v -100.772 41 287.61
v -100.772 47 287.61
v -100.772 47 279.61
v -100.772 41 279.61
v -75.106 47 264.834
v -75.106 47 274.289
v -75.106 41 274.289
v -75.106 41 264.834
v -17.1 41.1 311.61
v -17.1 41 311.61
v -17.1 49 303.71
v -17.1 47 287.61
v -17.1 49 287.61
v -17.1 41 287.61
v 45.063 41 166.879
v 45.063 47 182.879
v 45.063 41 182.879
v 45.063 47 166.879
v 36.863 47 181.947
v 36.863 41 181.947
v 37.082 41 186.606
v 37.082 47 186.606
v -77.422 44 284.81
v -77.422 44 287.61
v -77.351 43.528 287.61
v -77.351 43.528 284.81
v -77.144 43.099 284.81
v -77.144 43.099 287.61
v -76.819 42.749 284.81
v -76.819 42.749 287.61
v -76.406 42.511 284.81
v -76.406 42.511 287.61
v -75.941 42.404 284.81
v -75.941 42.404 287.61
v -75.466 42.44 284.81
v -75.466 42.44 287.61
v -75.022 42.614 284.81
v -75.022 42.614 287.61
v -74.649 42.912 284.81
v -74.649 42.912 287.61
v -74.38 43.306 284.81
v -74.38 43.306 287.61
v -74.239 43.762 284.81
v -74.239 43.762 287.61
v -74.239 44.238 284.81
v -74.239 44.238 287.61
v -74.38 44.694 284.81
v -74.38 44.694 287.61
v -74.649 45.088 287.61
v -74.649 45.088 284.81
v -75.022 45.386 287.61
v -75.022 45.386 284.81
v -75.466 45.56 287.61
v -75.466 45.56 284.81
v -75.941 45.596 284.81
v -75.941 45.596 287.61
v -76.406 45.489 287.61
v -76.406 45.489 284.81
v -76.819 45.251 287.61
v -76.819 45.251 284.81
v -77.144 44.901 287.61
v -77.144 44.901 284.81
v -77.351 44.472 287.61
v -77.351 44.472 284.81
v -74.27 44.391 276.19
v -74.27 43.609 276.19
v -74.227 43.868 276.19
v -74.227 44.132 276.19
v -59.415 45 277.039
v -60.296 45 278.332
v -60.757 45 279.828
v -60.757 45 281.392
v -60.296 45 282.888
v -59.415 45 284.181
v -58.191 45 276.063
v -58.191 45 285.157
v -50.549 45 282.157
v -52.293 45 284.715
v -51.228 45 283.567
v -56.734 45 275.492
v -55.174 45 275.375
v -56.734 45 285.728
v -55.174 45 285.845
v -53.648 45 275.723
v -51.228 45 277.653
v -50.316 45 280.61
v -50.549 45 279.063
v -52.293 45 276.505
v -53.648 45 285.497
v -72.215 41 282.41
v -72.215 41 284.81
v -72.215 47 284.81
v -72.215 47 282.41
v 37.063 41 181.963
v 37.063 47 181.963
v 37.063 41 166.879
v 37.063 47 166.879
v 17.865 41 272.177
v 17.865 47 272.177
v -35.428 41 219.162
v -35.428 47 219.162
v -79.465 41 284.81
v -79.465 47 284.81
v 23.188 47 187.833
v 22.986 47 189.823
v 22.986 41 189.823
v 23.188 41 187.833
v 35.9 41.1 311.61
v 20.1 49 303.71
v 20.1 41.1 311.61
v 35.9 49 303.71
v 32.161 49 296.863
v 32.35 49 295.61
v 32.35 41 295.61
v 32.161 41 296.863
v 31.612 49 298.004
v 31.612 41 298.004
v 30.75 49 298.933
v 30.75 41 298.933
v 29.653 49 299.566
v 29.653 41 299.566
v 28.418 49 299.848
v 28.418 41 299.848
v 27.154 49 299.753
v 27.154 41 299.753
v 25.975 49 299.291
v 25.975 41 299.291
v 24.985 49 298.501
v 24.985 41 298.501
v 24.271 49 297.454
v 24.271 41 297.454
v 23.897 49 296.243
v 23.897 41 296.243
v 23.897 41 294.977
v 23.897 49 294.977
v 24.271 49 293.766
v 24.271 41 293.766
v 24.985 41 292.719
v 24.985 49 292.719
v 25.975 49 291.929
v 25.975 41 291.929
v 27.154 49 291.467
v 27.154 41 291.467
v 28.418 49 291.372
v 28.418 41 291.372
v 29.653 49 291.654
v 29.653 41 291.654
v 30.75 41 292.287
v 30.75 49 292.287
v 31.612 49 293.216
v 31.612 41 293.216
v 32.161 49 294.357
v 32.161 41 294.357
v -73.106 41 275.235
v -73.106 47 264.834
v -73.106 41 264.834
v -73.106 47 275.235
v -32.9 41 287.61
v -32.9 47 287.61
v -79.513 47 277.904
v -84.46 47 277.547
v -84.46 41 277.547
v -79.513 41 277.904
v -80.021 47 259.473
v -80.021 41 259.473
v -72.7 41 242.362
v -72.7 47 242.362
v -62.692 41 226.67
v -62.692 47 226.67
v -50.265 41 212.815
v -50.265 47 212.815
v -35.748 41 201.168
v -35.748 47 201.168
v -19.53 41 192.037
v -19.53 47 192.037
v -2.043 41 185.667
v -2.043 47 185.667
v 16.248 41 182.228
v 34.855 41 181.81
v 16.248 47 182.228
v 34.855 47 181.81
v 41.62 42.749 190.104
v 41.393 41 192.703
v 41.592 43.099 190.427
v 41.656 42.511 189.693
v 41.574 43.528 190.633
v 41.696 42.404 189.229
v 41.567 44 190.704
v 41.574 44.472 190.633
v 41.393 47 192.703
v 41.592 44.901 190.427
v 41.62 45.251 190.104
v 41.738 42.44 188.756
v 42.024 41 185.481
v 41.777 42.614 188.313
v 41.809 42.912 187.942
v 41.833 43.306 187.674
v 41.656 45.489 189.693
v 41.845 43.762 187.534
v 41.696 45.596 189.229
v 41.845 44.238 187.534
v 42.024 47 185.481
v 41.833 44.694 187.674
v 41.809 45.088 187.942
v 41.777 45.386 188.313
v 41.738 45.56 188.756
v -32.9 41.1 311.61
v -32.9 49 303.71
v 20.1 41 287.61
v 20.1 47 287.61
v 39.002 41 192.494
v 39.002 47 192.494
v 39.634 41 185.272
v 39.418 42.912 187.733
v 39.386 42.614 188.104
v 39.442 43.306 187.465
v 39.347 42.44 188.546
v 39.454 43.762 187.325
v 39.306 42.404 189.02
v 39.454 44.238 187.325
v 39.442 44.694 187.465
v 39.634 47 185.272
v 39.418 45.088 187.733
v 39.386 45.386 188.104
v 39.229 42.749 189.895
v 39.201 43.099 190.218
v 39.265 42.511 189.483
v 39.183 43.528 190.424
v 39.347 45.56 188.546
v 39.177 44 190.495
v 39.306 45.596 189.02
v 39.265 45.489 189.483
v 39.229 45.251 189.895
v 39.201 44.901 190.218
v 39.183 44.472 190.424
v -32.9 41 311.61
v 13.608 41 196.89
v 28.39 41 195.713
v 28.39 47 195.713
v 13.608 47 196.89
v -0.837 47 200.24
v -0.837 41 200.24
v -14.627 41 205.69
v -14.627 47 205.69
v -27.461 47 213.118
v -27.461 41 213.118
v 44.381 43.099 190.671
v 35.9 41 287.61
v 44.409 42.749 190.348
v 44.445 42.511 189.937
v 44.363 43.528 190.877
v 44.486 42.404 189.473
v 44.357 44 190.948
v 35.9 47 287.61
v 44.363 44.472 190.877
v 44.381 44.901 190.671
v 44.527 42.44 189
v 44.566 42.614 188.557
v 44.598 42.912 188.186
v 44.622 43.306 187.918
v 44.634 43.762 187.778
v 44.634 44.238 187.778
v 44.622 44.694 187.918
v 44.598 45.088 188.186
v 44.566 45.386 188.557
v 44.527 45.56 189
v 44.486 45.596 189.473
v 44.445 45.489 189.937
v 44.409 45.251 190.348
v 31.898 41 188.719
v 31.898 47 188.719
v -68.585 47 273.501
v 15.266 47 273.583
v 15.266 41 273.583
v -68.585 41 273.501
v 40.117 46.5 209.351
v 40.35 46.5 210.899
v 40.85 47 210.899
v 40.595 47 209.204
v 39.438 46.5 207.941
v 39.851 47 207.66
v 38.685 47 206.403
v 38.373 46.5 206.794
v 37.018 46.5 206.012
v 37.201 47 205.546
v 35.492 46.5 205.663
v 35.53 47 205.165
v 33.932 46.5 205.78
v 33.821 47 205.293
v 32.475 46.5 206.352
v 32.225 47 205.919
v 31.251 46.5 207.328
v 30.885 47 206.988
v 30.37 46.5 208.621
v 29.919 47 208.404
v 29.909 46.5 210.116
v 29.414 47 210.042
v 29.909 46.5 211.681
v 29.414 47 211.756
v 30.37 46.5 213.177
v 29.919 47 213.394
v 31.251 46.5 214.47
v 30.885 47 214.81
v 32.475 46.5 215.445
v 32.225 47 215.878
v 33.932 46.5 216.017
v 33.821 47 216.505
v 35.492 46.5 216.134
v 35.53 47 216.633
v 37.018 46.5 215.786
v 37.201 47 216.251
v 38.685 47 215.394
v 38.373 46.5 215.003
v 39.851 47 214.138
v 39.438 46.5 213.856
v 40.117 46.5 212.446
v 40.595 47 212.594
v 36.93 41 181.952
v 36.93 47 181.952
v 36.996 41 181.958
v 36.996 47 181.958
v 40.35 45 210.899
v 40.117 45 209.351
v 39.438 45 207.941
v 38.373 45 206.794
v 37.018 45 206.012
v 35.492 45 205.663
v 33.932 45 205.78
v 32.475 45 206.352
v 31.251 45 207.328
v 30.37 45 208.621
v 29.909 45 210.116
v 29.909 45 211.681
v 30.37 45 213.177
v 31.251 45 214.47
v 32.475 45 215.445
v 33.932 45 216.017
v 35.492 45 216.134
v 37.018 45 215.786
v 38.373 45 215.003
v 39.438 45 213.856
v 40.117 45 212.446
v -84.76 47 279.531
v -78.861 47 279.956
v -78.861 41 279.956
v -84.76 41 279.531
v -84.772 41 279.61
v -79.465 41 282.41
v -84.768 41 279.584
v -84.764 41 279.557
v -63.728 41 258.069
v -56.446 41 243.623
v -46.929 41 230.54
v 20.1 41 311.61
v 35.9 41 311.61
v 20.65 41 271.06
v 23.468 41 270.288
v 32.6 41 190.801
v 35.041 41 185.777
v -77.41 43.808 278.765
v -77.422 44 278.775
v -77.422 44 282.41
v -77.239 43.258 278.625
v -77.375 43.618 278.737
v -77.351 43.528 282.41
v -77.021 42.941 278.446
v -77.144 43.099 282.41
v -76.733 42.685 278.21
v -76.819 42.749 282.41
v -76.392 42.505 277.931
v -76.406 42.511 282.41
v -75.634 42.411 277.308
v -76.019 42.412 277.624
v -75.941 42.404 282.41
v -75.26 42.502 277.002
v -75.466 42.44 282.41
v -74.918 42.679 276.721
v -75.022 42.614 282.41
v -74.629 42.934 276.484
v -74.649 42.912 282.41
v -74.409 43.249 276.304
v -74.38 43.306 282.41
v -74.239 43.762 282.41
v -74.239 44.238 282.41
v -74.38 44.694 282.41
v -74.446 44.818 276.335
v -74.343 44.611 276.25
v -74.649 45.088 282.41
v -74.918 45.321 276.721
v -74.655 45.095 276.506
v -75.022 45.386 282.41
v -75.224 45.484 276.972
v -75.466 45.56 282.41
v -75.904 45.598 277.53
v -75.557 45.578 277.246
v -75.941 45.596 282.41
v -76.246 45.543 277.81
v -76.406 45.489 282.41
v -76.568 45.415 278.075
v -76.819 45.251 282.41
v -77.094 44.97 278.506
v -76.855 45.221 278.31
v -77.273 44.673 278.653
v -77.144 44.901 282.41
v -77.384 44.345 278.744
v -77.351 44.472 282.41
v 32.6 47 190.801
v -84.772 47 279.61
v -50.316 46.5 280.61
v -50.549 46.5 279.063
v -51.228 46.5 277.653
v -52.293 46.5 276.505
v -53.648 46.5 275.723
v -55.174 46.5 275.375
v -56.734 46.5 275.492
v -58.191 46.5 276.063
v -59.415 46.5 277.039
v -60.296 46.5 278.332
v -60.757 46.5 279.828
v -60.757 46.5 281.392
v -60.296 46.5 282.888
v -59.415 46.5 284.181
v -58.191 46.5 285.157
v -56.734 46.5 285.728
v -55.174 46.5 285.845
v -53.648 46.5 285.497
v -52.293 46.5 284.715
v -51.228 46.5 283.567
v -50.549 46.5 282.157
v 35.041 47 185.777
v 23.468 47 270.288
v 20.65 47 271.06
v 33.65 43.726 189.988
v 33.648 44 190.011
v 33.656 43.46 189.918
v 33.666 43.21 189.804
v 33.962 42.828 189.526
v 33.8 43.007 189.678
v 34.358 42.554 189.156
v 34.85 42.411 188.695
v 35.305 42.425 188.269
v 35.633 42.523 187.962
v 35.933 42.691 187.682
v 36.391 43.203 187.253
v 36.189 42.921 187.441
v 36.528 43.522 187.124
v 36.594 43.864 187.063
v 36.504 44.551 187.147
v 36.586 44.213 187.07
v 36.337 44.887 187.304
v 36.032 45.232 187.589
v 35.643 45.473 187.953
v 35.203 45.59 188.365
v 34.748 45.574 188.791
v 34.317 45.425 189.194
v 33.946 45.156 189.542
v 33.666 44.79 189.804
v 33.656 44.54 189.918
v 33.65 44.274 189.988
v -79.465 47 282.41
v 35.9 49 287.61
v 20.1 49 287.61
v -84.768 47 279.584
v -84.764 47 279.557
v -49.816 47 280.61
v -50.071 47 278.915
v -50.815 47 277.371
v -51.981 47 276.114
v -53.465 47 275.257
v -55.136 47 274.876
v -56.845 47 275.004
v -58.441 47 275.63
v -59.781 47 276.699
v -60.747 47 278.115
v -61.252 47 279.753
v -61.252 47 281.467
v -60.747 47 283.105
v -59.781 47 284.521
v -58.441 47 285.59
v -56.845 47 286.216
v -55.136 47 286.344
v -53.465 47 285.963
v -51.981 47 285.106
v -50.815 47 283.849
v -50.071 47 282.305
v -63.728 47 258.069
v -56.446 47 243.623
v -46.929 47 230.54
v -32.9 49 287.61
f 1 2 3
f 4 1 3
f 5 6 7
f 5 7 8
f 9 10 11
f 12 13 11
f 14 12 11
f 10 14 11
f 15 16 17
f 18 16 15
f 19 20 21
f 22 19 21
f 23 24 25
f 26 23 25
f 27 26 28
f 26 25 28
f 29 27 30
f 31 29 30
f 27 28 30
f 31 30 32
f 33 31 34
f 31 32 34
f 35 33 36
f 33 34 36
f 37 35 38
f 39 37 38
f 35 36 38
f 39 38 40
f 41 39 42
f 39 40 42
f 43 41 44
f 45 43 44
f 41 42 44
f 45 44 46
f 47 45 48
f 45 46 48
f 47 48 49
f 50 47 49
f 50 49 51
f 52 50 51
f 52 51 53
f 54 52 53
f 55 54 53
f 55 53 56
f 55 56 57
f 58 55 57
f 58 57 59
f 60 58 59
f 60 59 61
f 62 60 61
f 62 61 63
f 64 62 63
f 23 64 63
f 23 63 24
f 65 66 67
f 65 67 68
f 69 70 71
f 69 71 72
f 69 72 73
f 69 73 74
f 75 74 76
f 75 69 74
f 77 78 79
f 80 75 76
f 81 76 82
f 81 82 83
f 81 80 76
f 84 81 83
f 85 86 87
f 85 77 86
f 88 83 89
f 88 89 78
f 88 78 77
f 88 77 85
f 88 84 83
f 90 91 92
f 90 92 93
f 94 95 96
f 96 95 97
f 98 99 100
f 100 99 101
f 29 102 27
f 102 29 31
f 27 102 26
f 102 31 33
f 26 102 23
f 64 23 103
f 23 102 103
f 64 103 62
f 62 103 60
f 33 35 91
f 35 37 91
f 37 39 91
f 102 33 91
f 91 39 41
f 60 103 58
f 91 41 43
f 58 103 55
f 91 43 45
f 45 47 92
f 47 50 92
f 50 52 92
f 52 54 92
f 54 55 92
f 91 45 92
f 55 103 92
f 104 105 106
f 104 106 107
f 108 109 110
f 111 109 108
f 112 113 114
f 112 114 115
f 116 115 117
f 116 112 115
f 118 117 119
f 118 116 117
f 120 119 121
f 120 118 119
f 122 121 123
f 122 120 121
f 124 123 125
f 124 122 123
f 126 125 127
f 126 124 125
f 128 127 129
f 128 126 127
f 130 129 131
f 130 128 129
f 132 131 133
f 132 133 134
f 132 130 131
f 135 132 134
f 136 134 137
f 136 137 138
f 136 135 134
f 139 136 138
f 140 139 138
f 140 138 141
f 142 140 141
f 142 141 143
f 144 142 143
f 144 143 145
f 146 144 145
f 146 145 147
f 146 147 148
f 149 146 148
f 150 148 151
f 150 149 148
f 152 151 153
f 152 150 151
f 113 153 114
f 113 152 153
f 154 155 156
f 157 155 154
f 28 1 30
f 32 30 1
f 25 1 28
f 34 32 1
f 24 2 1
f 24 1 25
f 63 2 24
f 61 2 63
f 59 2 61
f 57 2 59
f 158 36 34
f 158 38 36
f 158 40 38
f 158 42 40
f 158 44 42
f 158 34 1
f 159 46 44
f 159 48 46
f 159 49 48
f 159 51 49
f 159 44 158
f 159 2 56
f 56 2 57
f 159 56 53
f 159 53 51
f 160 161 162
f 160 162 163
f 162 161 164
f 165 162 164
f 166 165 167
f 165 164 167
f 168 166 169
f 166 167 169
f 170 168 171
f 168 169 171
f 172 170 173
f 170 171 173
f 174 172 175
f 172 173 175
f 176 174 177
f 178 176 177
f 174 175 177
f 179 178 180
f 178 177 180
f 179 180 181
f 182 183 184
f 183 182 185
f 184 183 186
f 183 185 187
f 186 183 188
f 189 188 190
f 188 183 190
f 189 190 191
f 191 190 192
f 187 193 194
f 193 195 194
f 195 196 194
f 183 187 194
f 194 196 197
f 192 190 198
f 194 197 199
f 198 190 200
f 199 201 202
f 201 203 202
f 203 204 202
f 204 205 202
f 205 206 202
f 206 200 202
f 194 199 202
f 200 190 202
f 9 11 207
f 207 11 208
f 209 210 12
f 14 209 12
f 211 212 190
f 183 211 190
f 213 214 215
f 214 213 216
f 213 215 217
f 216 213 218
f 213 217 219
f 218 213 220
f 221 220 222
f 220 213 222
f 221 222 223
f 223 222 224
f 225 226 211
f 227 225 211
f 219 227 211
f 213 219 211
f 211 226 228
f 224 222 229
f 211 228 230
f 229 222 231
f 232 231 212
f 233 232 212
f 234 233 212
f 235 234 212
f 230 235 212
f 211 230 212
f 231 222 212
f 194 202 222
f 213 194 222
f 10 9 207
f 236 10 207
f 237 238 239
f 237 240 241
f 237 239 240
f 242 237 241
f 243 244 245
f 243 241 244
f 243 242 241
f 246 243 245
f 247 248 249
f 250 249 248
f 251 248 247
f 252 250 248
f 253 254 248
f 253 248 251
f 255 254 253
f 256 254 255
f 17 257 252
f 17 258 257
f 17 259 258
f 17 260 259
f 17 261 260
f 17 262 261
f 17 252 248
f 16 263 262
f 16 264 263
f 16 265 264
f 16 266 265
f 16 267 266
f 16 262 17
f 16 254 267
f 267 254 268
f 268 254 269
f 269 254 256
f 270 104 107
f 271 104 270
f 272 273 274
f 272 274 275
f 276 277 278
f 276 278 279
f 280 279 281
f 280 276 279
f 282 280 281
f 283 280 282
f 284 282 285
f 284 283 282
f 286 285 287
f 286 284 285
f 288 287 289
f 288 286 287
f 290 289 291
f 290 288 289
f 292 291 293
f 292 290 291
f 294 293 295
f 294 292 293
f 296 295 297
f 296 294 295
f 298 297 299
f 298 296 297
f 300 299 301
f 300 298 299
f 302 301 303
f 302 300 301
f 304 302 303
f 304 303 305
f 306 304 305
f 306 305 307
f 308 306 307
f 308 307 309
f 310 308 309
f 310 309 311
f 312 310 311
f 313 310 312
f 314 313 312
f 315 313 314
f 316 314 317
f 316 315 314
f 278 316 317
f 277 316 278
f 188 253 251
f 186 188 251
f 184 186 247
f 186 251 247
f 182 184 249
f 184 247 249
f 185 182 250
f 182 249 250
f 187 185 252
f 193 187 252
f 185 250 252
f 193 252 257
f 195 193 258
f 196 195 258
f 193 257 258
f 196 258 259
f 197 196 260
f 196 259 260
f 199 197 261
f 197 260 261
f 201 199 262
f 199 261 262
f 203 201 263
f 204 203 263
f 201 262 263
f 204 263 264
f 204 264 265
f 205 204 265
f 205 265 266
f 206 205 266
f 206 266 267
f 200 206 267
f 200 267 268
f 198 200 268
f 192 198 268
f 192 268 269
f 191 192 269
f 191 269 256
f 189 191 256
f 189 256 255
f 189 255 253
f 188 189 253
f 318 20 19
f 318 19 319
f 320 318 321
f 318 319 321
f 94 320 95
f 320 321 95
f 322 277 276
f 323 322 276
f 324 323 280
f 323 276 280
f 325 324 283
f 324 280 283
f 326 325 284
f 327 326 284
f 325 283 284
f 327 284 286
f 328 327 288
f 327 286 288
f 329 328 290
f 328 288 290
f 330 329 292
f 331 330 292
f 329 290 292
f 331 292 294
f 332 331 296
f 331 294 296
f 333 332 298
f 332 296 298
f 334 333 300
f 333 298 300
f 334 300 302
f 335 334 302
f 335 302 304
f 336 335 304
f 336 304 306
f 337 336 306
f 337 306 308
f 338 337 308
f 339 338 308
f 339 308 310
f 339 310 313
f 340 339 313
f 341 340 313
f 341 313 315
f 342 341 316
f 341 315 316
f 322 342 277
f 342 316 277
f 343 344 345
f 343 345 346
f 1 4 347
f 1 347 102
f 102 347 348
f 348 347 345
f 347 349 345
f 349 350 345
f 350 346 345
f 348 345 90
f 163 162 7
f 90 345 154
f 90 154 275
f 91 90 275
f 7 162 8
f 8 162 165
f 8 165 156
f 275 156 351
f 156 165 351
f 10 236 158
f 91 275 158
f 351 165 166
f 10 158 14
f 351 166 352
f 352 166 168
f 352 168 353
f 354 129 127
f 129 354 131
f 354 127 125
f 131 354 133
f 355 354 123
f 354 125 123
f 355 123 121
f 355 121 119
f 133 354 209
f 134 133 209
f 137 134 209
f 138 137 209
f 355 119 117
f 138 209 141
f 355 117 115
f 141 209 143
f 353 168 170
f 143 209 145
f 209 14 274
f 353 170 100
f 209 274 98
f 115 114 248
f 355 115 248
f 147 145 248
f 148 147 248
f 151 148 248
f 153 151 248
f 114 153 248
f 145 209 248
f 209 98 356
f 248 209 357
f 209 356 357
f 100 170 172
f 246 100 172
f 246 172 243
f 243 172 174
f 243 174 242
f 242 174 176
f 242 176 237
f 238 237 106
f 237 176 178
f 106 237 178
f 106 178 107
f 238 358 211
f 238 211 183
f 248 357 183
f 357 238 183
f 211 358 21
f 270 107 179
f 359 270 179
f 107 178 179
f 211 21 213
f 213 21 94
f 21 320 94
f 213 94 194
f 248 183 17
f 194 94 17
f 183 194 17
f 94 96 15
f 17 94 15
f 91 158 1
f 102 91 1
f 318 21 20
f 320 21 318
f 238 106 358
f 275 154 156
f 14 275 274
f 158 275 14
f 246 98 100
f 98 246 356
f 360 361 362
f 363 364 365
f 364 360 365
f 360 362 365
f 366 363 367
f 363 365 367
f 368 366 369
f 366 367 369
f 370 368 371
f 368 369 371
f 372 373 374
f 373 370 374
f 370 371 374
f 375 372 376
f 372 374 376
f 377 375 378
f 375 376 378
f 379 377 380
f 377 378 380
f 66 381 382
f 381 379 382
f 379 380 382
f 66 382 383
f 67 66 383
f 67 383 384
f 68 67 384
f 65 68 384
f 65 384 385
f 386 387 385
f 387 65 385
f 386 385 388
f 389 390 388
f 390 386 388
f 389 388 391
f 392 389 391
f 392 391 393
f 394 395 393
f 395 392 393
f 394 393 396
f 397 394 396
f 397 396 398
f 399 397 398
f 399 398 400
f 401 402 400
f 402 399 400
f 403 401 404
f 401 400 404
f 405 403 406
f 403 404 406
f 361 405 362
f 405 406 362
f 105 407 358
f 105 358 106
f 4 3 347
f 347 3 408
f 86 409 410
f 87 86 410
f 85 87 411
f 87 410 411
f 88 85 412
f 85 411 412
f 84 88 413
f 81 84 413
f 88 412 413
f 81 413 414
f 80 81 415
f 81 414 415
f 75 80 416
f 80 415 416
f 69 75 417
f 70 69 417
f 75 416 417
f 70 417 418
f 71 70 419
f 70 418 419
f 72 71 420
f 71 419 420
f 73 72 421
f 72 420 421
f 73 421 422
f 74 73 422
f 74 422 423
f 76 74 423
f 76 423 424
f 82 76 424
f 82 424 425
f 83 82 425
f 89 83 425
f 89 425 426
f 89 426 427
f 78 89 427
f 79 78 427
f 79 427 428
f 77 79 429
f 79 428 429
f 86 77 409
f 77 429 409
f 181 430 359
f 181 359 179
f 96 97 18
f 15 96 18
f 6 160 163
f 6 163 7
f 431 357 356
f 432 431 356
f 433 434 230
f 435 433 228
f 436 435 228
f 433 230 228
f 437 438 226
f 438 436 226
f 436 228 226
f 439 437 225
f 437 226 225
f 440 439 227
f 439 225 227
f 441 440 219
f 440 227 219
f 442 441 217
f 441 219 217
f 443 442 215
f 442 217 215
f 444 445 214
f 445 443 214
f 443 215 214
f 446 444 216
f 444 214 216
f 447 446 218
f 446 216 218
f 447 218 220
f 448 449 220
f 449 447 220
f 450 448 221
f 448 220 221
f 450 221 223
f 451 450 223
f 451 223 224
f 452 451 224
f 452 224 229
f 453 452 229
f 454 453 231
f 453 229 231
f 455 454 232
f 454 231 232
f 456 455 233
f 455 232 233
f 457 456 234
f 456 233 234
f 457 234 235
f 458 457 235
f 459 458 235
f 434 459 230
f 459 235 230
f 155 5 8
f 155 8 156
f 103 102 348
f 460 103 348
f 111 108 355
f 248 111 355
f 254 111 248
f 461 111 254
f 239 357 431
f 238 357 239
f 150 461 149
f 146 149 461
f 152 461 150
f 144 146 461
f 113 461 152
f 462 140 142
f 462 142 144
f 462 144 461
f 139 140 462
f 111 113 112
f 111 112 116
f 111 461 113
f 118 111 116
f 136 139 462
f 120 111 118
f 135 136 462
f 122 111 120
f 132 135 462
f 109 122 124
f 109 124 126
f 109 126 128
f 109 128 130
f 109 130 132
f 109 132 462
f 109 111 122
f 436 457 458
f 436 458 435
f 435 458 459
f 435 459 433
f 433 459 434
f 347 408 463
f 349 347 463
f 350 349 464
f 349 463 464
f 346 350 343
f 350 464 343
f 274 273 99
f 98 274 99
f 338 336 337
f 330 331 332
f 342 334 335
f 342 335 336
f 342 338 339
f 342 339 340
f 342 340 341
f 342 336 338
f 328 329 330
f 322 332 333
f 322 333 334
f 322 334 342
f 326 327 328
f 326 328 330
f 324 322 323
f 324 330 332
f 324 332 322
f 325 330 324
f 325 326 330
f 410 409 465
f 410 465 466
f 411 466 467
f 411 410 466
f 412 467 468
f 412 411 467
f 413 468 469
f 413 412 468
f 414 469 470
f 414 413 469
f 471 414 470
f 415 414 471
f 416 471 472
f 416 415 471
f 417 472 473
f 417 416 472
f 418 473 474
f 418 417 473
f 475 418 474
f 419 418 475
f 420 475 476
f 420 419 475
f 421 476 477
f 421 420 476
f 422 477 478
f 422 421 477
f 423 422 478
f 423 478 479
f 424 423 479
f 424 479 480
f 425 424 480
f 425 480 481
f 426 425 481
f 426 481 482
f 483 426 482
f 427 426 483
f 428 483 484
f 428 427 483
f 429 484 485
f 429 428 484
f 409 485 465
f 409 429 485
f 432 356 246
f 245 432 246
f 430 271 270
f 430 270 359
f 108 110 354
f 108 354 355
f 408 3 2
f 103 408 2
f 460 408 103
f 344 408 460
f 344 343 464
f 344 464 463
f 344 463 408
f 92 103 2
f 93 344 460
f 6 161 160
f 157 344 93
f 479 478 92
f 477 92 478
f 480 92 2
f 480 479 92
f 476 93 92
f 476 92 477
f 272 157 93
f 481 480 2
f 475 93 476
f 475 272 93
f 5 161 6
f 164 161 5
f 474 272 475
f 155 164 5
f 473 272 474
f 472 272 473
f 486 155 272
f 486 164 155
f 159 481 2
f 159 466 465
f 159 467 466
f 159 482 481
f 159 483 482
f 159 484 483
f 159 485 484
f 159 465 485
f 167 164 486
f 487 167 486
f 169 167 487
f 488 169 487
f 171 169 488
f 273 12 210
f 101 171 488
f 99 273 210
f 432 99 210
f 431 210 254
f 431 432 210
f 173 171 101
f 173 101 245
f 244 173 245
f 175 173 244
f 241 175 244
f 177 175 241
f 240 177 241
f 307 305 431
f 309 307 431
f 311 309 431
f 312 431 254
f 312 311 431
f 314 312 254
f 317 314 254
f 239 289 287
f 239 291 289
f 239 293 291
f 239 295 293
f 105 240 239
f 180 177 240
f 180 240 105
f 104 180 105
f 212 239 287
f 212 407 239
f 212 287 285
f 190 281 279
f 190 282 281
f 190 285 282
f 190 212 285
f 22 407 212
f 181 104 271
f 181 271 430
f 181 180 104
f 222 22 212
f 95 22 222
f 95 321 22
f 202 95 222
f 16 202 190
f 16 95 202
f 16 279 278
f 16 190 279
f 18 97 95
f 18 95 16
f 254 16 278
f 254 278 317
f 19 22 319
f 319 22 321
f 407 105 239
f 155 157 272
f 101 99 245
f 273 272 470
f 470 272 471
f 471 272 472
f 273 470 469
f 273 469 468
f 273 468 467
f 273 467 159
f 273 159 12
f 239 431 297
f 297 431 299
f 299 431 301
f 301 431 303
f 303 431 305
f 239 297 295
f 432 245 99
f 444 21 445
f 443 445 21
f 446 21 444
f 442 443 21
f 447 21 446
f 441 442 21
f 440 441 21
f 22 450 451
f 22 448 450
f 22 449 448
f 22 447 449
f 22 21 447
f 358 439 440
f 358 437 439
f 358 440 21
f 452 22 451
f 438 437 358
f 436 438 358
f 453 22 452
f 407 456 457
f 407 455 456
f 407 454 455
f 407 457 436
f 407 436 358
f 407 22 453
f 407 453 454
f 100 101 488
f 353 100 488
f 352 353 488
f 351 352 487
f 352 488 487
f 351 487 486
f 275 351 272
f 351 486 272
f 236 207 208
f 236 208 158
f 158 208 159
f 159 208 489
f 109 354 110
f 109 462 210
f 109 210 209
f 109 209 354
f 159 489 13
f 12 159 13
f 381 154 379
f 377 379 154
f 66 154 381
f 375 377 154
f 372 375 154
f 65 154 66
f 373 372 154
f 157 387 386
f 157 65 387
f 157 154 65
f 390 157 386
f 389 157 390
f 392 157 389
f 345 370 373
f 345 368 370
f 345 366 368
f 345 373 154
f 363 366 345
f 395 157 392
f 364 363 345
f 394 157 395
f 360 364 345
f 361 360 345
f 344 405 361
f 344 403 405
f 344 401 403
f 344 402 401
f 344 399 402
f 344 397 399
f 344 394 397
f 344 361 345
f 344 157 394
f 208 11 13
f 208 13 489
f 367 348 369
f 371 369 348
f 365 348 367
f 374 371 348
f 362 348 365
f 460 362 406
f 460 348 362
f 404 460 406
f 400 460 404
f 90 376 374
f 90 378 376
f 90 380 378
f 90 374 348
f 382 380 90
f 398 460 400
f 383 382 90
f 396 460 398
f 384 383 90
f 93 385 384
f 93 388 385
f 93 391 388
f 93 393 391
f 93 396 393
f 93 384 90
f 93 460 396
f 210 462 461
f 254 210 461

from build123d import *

# Parameters (mm, degrees)
SKETCH119_R     = 4.25
PAD037_DEPTH    = 8
POCKET089_DEPTH = 10
SKETCH145_W     = 212.757988
SKETCH145_H     = 111.377136
POCKET090_DEPTH = 2
CHAMFER024_SIZE = 7.9
SKETCH146_W     = 16
SKETCH146_H     = 8
SKETCH146_W_2   = 8
SKETCH146_H_2   = 16
PAD043_DEPTH    = 6
POCKET091_DEPTH = 6
SKETCH148_R     = 5.25
POCKET092_DEPTH = 2
CHAMFER025_SIZE = 0.5
SKETCH149_W     = 7.25
SKETCH149_H     = 2.4
POCKET093_DEPTH = 6
SKETCH150_R     = 1.6
POCKET094_DEPTH = 11.42
SKETCH151_R     = 1.6
POCKET095_DEPTH = 10.75


with BuildPart() as part:
    # Sketch119 → Pad037 (new body)
    with BuildSketch(Plane.XZ):
        with BuildLine():
            Line((43.1, 311.61), (58.9, 311.61))
            Line((58.9, 311.61), (58.9, 287.61))
            Line((58.9, 287.61), (68.0627698178, 182.8790617439))
            ThreePointArc((-62.6189518066, 287.61), (-20.1922299081, 206.652605958), (68.0627698178, 182.8790617439))
            Line((-9.9, 287.61), (-62.6189518066, 287.61))
            Line((-9.9, 311.61), (-9.9, 287.61))
            Line((5.9, 311.61), (-9.9, 311.61))
            Line((5.9, 287.61), (5.9, 311.61))
            Line((43.1, 287.61), (5.9, 287.61))
            Line((43.1, 287.61), (43.1, 311.61))
        make_face()
        with Locations((51.1, 295.61)):
            Circle(SKETCH119_R, mode=Mode.SUBTRACT)
    extrude(amount=PAD037_DEPTH)

    # Sketch144 (on Sketch) → Pocket089 (cut, symmetric)
    with BuildSketch(Plane(origin=(0, -2, 0), x_dir=(1, 0, 0), z_dir=(0, 1, 0))):
        with BuildLine():
            Line((46.4683764269, -270.2884951656), (51.3899439591, -195.7125763223))
            ThreePointArc((51.3899439591, -195.7125763223), (22.163397434, -200.2401058051), (-4.4606389833, -213.1183910114))
            Line((43.6500461, -271.0604538296), (-4.4606389833, -213.1183910114))
            Line((46.4683764269, -270.2884951656), (43.6500461, -271.0604538296))
        make_face()
        with BuildLine():
            Line((38.2664280008, -273.5828375694), (-45.585449, -273.501129))
            ThreePointArc((-12.4277002687, -219.1620599694), (-33.4458091568, -243.6227695917), (-45.585449, -273.501129))
            Line((40.8654991159, -272.1768310477), (-12.4277002687, -219.1620599694))
            Line((38.2664280008, -273.5828375694), (40.8654991159, -272.1768310477))
        make_face()
    extrude(amount=POCKET089_DEPTH, both=True, mode=Mode.SUBTRACT)

    # Sketch145 (on Face4 of Pocket089) → Pocket090 (cut)
    with BuildSketch(Plane(origin=(0, 0, 0), x_dir=(1, 0, 0), z_dir=(0, 1, 0))):
        with Locations((0.739727, -231.921432)):
            Rectangle(SKETCH145_W, SKETCH145_H)
    extrude(amount=-POCKET090_DEPTH, mode=Mode.SUBTRACT)

    # Chamfer024
    chamfer024_edges = [part.edges().sort_by_distance(p)[0] for p in [
        (51, 0, 311.61),
        (-2, 0, 311.61),
    ]]
    chamfer(chamfer024_edges, length=CHAMFER024_SIZE)

    # Sketch146 (on Face24 of Chamfer024) → Pad043 (join)
    with BuildSketch(Plane(origin=(0, -2, 0), x_dir=(1, 0, 0), z_dir=(0, 1, 0))):
        with Locations((-69.7716084762, -283.61)):
            Rectangle(SKETCH146_W, SKETCH146_H)
        with Locations((64.0627698178, -174.8790617439)):
            Rectangle(SKETCH146_W_2, SKETCH146_H_2)
    extrude(amount=-PAD043_DEPTH)

    # Sketch147 (on Face26 of Pad043) → Pocket091 (cut)
    with BuildSketch(Plane(origin=(0, -2, 0), x_dir=(1, 0, 0), z_dir=(0, 1, 0))):
        Polygon((59.8525224324, -181.7142315678), (60.0816034962, -186.6062288871), (55.6003748066, -190.8009391349), (45.9859602644, -189.8230627729), (46.188335, -187.833328), (54.8977345384, -188.7191558264), (58.040592409, -185.7772443485), (57.8465339537, -181.633150432), align=None)
        Polygon((-62.4277412024, -277.4774293102), (-56.5131742791, -277.9036519615), (-52.105898537, -274.2887258472), (-52.105898537, -264.8339163664), (-50.105898537, -264.8339163664), (-50.105898537, -275.234992563), (-55.8614558604, -279.9558032607), (-62.5714948328, -279.4722563437), align=None)
    extrude(amount=-POCKET091_DEPTH, mode=Mode.SUBTRACT)

    # Sketch148 (on Face42 of Pocket091) → Pocket092 (cut)
    with BuildSketch(Plane(origin=(0, -2, 0), x_dir=(1, 0, 0), z_dir=(0, 1, 0))):
        with Locations((-32.5660026534, -280.61)):
            Circle(SKETCH148_R)
        with Locations((58.1, -210.8987256618)):
            Circle(SKETCH148_R)
    extrude(amount=-POCKET092_DEPTH, mode=Mode.SUBTRACT)

    # Chamfer025
    chamfer025_edges = [part.edges().sort_by_distance(p)[0] for p in [
        (52.85, -2, 210.898726),
        (-37.816003, -2, 280.61),
    ]]
    chamfer(chamfer025_edges, length=CHAMFER025_SIZE)

    # Sketch149 (on Face1 of Chamfer025) → Pocket093 (cut)
    with BuildSketch(Plane(origin=(0, -2, 0), x_dir=(1, 0, 0), z_dir=(0, 1, 0))):
        with Locations((-52.8400088116, -283.61)):
            Rectangle(SKETCH149_W, SKETCH149_H)
        Polygon((62.6335907882, -185.2715531365), (62.0017116533, -192.4939646977), (64.3925789287, -192.7031384803), (65.0244580636, -185.4807269191), align=None)
    extrude(amount=-POCKET093_DEPTH, mode=Mode.SUBTRACT)

    # Sketch150 (on Face6 of Pocket093) → Pocket094 (cut)
    with BuildSketch(Plane(origin=(0, 0, 287.61), x_dir=(-1, 0, 0), z_dir=(0, 0, 1))):
        with Locations((52.8216084762, 5)):
            Circle(SKETCH150_R)
    extrude(amount=-POCKET094_DEPTH, mode=Mode.SUBTRACT)

    # Sketch151 (on Face5 of Pocket094) → Pocket095 (cut)
    with BuildSketch(Plane(origin=(83.4240645156, 0, 7.2986599104), x_dir=(-0.0871557427, 0, 0.9961946981), z_dir=(0.9961946981, 0, 0.0871557427))):
        with Locations((182.7510904443, 5)):
            Circle(SKETCH151_R)
    extrude(amount=-POCKET095_DEPTH, mode=Mode.SUBTRACT)


with BuildPart() as part_1:
    # Body028 placement: moved
    add(part.part.moved(Location((-23, 49, 0))))


solid = part_1.part
